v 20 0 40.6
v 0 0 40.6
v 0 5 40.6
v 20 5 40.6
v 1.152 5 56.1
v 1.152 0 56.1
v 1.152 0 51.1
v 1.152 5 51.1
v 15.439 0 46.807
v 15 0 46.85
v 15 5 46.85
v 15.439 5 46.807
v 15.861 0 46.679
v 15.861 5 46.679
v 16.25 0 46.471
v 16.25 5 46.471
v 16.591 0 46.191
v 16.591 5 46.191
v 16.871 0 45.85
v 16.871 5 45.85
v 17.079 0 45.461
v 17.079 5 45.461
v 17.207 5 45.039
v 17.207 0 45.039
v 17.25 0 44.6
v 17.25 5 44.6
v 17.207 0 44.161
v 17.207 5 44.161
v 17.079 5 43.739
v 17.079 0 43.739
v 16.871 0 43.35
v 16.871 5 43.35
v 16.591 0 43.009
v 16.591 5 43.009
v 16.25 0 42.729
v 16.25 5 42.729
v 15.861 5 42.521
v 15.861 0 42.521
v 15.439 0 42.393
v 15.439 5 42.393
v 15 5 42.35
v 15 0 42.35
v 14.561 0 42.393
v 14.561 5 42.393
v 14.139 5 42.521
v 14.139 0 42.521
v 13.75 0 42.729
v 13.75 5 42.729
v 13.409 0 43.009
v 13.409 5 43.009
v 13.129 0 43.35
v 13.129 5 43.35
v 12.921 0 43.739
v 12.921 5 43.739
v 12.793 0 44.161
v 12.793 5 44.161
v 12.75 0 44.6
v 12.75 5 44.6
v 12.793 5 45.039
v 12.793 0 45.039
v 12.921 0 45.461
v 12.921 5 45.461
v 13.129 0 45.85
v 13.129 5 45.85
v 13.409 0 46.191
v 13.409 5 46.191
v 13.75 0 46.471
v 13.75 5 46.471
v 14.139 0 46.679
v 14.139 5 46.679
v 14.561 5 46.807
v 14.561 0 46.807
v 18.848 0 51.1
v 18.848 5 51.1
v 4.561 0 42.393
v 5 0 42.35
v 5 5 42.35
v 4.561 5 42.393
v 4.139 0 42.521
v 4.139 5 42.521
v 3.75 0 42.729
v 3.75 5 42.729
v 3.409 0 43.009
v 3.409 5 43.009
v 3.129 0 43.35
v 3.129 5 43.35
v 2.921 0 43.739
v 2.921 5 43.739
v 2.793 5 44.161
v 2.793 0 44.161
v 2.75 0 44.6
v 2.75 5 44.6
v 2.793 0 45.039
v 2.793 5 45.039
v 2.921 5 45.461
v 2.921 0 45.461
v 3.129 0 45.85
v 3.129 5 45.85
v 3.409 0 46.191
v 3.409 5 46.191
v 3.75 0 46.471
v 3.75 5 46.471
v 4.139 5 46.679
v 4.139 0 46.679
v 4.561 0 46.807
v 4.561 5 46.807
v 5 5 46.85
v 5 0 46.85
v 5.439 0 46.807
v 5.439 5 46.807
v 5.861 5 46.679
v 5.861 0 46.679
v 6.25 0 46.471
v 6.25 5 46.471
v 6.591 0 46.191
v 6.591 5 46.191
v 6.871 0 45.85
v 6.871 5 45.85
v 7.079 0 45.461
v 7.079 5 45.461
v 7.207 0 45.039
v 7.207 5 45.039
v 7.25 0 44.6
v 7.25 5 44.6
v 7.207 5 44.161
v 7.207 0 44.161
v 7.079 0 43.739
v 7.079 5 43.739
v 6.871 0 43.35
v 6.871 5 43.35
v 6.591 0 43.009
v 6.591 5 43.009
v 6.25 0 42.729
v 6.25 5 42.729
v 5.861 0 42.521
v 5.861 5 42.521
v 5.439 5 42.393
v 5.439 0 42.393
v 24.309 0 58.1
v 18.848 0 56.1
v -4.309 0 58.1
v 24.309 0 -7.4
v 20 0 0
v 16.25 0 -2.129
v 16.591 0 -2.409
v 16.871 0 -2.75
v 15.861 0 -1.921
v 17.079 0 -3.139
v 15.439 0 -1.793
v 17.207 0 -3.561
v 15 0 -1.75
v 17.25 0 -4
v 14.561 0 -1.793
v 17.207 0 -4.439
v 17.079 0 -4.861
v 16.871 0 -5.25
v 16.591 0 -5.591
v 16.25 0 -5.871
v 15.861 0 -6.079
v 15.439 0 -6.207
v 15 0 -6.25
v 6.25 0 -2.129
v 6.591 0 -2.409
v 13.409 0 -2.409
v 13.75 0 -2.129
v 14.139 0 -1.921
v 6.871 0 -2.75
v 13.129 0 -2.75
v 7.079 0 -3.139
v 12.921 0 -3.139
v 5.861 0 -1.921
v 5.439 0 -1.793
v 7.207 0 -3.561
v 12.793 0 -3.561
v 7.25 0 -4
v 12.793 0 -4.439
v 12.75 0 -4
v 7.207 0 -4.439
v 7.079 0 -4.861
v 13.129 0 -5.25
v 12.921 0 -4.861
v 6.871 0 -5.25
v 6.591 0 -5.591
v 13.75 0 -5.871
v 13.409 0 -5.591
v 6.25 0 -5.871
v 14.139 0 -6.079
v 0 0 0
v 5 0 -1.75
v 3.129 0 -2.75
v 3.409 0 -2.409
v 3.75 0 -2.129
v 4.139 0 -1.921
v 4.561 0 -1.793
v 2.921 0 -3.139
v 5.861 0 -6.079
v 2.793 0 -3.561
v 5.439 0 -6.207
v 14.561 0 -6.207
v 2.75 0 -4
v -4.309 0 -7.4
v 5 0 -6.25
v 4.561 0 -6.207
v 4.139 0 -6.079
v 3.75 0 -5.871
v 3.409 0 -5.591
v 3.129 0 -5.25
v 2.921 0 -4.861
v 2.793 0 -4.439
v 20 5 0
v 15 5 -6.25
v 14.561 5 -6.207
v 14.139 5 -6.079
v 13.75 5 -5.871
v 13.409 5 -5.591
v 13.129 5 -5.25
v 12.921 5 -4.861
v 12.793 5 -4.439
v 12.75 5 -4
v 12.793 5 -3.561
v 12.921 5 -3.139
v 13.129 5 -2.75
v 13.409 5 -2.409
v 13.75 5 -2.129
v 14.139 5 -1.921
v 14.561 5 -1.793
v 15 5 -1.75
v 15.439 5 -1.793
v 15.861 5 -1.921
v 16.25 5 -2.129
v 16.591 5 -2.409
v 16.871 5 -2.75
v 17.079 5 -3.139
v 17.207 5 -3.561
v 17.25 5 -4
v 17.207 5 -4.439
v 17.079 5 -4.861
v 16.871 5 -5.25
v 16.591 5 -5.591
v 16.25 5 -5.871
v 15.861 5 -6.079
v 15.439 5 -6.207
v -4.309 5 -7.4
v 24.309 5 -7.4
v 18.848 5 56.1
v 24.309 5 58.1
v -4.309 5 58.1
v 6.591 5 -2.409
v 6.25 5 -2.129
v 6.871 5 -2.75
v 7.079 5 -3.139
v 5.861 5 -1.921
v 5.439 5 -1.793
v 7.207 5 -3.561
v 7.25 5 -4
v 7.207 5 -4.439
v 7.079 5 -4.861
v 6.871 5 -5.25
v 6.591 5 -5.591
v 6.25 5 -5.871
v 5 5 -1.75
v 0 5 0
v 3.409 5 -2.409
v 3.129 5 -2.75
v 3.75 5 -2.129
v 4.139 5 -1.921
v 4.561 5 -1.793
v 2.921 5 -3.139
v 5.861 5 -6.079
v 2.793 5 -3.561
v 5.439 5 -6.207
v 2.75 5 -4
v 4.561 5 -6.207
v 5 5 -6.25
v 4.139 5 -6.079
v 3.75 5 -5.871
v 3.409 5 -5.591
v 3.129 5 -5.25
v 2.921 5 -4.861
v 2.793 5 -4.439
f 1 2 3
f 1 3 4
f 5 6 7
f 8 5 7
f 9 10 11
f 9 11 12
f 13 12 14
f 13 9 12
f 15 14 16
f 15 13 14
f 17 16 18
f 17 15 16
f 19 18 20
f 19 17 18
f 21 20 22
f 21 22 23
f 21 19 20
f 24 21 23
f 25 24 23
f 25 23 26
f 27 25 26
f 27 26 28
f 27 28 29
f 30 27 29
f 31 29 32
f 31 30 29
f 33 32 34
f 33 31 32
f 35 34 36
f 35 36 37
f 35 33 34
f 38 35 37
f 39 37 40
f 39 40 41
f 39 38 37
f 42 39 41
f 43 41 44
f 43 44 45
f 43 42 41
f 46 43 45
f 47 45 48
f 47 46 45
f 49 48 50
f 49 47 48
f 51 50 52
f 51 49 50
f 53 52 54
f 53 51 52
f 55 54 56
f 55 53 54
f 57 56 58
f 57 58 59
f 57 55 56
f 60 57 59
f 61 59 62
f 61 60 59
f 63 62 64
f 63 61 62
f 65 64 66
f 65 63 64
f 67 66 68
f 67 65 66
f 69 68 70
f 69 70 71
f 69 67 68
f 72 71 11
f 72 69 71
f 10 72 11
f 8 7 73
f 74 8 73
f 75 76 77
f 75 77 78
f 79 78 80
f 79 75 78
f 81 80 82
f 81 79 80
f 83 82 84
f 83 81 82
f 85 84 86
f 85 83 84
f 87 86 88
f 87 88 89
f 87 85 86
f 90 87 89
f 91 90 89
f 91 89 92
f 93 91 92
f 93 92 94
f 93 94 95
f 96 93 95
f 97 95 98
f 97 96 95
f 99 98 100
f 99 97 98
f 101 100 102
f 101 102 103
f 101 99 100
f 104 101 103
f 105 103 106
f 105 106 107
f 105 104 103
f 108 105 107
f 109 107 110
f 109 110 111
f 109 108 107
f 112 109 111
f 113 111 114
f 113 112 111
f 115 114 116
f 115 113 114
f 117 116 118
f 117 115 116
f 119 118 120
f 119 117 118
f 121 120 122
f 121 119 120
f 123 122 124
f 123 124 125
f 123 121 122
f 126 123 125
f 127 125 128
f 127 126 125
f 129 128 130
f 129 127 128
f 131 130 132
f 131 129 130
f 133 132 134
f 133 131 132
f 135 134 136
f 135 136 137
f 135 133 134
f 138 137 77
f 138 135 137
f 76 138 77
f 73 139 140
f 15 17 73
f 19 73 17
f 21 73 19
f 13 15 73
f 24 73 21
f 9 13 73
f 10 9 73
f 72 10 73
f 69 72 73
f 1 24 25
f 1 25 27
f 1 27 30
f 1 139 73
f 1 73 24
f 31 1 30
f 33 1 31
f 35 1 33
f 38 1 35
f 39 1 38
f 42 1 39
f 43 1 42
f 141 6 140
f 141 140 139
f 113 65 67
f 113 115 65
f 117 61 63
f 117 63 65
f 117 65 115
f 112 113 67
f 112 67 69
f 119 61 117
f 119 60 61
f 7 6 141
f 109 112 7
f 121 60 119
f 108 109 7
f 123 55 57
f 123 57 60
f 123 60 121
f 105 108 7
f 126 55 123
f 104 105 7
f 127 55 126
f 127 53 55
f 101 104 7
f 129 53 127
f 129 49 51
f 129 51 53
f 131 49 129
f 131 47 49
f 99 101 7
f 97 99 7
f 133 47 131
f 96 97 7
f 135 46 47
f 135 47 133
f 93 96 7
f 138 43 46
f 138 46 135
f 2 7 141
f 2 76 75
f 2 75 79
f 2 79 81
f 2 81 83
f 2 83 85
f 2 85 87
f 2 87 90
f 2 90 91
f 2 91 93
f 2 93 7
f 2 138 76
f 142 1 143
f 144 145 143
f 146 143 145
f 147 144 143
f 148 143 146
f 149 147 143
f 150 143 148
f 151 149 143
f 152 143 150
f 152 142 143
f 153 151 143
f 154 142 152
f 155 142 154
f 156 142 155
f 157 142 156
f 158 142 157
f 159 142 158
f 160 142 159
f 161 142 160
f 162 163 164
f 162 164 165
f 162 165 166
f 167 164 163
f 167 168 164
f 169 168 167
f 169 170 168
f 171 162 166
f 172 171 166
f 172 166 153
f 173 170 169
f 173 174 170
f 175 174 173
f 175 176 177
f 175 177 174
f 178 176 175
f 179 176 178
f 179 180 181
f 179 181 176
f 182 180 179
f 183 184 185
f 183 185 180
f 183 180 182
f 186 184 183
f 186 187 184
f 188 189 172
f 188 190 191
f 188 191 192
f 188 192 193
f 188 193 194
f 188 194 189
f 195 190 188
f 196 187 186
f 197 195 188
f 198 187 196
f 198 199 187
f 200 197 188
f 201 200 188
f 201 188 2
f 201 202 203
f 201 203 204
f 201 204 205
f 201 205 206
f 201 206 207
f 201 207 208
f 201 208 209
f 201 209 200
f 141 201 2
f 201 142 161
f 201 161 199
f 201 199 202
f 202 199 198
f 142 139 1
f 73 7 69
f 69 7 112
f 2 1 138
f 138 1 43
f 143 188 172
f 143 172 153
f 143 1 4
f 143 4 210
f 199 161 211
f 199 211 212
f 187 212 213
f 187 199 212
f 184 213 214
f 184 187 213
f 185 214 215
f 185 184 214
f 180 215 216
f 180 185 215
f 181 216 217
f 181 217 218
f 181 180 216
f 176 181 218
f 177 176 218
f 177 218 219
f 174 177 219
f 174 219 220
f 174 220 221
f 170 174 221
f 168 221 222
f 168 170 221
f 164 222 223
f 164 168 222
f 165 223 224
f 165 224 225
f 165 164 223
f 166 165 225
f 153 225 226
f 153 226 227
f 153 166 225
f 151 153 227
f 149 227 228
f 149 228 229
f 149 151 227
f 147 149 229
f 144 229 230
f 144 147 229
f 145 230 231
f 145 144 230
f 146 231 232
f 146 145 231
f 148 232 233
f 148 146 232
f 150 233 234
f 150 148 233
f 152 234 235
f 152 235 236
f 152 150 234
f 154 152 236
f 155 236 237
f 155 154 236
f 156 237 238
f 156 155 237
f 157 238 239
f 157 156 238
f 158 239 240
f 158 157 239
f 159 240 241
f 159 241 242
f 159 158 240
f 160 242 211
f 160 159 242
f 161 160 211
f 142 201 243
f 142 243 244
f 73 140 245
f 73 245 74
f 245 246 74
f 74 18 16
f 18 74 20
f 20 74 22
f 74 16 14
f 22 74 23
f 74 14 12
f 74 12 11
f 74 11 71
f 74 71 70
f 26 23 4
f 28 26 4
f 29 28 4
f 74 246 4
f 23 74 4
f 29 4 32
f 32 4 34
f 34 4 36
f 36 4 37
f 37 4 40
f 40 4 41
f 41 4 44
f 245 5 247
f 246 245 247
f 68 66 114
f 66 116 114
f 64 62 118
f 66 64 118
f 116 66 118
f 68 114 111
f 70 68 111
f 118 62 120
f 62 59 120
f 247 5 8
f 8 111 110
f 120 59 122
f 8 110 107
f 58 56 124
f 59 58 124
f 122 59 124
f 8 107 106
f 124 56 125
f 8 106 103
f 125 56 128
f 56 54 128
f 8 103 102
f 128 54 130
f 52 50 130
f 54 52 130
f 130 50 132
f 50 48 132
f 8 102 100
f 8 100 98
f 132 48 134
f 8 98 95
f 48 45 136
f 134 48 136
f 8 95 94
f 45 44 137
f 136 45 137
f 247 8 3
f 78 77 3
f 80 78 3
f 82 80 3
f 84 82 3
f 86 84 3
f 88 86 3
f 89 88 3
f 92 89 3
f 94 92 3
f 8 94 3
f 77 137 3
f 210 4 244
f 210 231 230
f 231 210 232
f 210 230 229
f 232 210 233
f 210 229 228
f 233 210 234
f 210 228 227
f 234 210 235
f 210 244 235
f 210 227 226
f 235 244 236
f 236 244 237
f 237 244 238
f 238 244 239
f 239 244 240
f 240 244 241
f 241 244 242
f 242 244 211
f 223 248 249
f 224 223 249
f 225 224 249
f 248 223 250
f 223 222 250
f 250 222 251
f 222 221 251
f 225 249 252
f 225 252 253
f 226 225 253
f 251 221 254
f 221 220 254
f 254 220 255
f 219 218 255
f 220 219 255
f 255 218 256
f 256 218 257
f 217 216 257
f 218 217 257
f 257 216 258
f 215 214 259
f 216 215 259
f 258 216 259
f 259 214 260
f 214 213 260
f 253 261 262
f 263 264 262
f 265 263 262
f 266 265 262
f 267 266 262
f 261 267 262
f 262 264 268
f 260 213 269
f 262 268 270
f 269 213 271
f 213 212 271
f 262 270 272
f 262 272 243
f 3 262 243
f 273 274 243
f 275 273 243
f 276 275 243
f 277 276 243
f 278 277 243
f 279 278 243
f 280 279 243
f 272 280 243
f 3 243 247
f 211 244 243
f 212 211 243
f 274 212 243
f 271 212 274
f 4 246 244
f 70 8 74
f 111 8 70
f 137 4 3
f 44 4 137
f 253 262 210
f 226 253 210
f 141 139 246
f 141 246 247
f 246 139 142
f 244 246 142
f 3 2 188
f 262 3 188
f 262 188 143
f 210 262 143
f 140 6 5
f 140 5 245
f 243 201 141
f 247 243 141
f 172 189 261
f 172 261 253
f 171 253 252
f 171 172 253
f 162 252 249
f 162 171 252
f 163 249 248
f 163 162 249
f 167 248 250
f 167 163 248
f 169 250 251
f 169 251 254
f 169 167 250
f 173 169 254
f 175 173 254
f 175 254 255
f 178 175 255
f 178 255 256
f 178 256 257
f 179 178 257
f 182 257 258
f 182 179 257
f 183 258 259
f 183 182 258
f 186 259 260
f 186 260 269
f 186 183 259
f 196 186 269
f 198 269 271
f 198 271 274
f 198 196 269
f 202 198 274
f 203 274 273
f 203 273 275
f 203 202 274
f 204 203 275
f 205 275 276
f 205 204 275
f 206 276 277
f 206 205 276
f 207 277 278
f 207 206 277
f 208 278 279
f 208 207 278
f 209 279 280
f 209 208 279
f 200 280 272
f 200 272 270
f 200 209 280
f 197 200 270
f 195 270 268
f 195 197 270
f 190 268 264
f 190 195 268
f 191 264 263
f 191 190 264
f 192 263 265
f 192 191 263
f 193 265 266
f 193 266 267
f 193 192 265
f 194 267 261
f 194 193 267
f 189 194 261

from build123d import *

# Parameters (mm, degrees)
SKETCH1_R           = 2.25
SKETCH1_W           = 20
SKETCH1_H           = 40.6
SKETCH1_W_2         = 17.696235852
SKETCH1_H_2         = 5
BOSS_EXTRUDE1_DEPTH = 5


with BuildPart() as part:
    # Sketch1 → Boss-Extrude1 (new body)
    with BuildSketch(Plane(origin=(0, 0, 0), x_dir=(1, 0, 0), z_dir=(0, 1, 0))):
        Polygon((-4.308878206, -48), (-4.308878206, 7.4), (24.308878206, 7.4), (24.308878206, -48), (24.308878206, -58.1), (-4.308878206, -58.1), align=None)
        with Locations(Location((5, 4, 0), (0, 0, 270))):
            Circle(SKETCH1_R, mode=Mode.SUBTRACT)
        with Locations(Location((15, 4, 0), (0, 0, 90))):
            Circle(SKETCH1_R, mode=Mode.SUBTRACT)
        with Locations(Location((5, -44.6, 0), (0, 0, 90))):
            Circle(SKETCH1_R, mode=Mode.SUBTRACT)
        with Locations(Location((15, -44.6, 0), (0, 0, 270))):
            Circle(SKETCH1_R, mode=Mode.SUBTRACT)
        with Locations((10, -20.3)):
            Rectangle(SKETCH1_W, SKETCH1_H, mode=Mode.SUBTRACT)
        with Locations((10, -53.6)):
            Rectangle(SKETCH1_W_2, SKETCH1_H_2, mode=Mode.SUBTRACT)
    extrude(amount=BOSS_EXTRUDE1_DEPTH)


solid = part.part
